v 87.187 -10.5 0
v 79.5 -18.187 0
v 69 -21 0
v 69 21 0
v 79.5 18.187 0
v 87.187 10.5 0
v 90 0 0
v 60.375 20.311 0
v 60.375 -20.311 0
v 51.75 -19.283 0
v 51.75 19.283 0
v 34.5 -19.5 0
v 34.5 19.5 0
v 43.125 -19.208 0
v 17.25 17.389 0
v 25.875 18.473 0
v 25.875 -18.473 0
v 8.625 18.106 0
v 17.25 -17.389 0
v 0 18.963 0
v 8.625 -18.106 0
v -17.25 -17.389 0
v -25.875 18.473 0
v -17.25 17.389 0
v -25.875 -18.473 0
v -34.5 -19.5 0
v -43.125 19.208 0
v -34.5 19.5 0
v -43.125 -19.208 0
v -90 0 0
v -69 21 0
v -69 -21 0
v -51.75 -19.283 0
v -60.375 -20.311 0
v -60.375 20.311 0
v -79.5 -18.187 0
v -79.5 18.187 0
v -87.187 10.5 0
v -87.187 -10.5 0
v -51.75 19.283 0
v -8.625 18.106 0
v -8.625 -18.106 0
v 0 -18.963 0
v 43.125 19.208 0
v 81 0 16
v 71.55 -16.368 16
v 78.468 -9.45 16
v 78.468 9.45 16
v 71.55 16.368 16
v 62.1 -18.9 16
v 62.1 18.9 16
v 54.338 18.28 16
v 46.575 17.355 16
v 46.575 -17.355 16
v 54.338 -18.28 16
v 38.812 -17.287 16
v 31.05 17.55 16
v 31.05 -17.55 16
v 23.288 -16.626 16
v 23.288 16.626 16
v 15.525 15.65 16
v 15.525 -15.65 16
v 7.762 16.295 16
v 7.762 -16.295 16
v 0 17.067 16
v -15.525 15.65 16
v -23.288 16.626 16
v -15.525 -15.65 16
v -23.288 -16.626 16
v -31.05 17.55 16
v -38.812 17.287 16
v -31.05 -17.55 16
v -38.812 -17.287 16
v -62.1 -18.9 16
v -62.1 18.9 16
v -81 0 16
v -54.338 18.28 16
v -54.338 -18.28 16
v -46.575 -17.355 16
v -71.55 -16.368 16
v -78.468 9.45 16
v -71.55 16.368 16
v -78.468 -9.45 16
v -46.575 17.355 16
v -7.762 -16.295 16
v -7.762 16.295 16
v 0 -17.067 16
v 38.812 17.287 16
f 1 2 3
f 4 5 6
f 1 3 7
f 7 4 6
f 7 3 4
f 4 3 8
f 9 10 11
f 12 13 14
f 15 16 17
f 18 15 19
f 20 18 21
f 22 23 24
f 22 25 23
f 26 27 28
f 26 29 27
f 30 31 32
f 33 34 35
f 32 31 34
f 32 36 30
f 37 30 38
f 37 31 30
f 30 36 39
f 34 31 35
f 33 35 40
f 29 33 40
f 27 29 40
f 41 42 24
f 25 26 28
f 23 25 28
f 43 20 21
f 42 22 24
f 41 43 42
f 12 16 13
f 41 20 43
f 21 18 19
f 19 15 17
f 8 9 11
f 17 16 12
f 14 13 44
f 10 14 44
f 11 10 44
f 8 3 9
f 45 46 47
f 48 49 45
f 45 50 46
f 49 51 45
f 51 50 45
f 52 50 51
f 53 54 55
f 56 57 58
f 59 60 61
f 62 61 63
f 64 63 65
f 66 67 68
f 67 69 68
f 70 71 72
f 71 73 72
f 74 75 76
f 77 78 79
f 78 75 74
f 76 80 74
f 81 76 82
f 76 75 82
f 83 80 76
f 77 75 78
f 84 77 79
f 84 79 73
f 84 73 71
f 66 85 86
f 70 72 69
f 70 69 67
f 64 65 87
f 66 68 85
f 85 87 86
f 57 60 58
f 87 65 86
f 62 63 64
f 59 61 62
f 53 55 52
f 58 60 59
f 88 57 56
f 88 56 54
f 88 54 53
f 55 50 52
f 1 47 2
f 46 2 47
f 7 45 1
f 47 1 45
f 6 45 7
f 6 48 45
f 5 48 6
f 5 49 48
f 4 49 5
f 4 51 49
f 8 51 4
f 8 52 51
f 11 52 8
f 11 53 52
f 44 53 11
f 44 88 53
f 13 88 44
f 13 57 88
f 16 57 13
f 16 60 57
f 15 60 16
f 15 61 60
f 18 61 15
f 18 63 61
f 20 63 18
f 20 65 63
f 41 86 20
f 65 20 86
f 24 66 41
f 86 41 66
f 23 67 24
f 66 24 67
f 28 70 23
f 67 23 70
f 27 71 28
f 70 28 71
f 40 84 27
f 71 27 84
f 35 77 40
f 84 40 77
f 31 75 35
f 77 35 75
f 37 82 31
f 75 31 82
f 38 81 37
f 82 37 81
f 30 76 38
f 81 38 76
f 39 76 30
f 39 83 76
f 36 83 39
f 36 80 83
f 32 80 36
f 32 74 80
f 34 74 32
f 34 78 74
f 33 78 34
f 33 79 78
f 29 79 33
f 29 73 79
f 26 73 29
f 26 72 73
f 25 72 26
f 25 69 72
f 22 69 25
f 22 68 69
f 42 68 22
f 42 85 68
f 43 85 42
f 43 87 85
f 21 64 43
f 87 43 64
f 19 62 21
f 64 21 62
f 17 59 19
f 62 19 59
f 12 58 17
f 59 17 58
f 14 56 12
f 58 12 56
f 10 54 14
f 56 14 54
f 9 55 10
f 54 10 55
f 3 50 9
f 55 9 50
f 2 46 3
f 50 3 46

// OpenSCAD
$fn = 32;

// ----------------------------------------------------------------------
// Handle: 180 x 42 mm grip, 16 mm thick
// ----------------------------------------------------------------------

// --- parameters (mm) ---
length = 180;             // grip length
width = 42;               // grip width
thickness = 16;           // grip thickness
waist = 0.86;             // width factor at the middle
draft = 0.9;              // top face scale of the extrusion
scallops = 4;             // finger rests per side
ripple = 0.05;            // depth factor of the finger rests

/* ergonomic grip outline, closed spline-like polygon in the XY plane */
grip = [[-69, 21], [-60.375, 20.311], [-51.75, 19.283], [-43.125, 19.208], [-34.5, 19.5], [-25.875, 18.473], [-17.25, 17.389], [-8.625, 18.106], [0, 18.963], [8.625, 18.106], [17.25, 17.389], [25.875, 18.473], [34.5, 19.5], [43.125, 19.208], [51.75, 19.283], [60.375, 20.311], [69, 21], [79.5, 18.187], [87.187, 10.5], [90, 0], [87.187, -10.5], [79.5, -18.187], [69, -21], [69, -21], [60.375, -20.311], [51.75, -19.283], [43.125, -19.208], [34.5, -19.5], [25.875, -18.473], [17.25, -17.389], [8.625, -18.106], [0, -18.963], [-8.625, -18.106], [-17.25, -17.389], [-25.875, -18.473], [-34.5, -19.5], [-43.125, -19.208], [-51.75, -19.283], [-60.375, -20.311], [-69, -21], [-79.5, -18.187], [-87.187, -10.5], [-90, 0], [-87.187, 10.5], [-79.5, 18.187], [-69, 21]];

module grip_body() {
  linear_extrude(height = thickness, scale = draft) polygon(grip);
}

difference() {
  union() {
    grip_body();
  }
}
